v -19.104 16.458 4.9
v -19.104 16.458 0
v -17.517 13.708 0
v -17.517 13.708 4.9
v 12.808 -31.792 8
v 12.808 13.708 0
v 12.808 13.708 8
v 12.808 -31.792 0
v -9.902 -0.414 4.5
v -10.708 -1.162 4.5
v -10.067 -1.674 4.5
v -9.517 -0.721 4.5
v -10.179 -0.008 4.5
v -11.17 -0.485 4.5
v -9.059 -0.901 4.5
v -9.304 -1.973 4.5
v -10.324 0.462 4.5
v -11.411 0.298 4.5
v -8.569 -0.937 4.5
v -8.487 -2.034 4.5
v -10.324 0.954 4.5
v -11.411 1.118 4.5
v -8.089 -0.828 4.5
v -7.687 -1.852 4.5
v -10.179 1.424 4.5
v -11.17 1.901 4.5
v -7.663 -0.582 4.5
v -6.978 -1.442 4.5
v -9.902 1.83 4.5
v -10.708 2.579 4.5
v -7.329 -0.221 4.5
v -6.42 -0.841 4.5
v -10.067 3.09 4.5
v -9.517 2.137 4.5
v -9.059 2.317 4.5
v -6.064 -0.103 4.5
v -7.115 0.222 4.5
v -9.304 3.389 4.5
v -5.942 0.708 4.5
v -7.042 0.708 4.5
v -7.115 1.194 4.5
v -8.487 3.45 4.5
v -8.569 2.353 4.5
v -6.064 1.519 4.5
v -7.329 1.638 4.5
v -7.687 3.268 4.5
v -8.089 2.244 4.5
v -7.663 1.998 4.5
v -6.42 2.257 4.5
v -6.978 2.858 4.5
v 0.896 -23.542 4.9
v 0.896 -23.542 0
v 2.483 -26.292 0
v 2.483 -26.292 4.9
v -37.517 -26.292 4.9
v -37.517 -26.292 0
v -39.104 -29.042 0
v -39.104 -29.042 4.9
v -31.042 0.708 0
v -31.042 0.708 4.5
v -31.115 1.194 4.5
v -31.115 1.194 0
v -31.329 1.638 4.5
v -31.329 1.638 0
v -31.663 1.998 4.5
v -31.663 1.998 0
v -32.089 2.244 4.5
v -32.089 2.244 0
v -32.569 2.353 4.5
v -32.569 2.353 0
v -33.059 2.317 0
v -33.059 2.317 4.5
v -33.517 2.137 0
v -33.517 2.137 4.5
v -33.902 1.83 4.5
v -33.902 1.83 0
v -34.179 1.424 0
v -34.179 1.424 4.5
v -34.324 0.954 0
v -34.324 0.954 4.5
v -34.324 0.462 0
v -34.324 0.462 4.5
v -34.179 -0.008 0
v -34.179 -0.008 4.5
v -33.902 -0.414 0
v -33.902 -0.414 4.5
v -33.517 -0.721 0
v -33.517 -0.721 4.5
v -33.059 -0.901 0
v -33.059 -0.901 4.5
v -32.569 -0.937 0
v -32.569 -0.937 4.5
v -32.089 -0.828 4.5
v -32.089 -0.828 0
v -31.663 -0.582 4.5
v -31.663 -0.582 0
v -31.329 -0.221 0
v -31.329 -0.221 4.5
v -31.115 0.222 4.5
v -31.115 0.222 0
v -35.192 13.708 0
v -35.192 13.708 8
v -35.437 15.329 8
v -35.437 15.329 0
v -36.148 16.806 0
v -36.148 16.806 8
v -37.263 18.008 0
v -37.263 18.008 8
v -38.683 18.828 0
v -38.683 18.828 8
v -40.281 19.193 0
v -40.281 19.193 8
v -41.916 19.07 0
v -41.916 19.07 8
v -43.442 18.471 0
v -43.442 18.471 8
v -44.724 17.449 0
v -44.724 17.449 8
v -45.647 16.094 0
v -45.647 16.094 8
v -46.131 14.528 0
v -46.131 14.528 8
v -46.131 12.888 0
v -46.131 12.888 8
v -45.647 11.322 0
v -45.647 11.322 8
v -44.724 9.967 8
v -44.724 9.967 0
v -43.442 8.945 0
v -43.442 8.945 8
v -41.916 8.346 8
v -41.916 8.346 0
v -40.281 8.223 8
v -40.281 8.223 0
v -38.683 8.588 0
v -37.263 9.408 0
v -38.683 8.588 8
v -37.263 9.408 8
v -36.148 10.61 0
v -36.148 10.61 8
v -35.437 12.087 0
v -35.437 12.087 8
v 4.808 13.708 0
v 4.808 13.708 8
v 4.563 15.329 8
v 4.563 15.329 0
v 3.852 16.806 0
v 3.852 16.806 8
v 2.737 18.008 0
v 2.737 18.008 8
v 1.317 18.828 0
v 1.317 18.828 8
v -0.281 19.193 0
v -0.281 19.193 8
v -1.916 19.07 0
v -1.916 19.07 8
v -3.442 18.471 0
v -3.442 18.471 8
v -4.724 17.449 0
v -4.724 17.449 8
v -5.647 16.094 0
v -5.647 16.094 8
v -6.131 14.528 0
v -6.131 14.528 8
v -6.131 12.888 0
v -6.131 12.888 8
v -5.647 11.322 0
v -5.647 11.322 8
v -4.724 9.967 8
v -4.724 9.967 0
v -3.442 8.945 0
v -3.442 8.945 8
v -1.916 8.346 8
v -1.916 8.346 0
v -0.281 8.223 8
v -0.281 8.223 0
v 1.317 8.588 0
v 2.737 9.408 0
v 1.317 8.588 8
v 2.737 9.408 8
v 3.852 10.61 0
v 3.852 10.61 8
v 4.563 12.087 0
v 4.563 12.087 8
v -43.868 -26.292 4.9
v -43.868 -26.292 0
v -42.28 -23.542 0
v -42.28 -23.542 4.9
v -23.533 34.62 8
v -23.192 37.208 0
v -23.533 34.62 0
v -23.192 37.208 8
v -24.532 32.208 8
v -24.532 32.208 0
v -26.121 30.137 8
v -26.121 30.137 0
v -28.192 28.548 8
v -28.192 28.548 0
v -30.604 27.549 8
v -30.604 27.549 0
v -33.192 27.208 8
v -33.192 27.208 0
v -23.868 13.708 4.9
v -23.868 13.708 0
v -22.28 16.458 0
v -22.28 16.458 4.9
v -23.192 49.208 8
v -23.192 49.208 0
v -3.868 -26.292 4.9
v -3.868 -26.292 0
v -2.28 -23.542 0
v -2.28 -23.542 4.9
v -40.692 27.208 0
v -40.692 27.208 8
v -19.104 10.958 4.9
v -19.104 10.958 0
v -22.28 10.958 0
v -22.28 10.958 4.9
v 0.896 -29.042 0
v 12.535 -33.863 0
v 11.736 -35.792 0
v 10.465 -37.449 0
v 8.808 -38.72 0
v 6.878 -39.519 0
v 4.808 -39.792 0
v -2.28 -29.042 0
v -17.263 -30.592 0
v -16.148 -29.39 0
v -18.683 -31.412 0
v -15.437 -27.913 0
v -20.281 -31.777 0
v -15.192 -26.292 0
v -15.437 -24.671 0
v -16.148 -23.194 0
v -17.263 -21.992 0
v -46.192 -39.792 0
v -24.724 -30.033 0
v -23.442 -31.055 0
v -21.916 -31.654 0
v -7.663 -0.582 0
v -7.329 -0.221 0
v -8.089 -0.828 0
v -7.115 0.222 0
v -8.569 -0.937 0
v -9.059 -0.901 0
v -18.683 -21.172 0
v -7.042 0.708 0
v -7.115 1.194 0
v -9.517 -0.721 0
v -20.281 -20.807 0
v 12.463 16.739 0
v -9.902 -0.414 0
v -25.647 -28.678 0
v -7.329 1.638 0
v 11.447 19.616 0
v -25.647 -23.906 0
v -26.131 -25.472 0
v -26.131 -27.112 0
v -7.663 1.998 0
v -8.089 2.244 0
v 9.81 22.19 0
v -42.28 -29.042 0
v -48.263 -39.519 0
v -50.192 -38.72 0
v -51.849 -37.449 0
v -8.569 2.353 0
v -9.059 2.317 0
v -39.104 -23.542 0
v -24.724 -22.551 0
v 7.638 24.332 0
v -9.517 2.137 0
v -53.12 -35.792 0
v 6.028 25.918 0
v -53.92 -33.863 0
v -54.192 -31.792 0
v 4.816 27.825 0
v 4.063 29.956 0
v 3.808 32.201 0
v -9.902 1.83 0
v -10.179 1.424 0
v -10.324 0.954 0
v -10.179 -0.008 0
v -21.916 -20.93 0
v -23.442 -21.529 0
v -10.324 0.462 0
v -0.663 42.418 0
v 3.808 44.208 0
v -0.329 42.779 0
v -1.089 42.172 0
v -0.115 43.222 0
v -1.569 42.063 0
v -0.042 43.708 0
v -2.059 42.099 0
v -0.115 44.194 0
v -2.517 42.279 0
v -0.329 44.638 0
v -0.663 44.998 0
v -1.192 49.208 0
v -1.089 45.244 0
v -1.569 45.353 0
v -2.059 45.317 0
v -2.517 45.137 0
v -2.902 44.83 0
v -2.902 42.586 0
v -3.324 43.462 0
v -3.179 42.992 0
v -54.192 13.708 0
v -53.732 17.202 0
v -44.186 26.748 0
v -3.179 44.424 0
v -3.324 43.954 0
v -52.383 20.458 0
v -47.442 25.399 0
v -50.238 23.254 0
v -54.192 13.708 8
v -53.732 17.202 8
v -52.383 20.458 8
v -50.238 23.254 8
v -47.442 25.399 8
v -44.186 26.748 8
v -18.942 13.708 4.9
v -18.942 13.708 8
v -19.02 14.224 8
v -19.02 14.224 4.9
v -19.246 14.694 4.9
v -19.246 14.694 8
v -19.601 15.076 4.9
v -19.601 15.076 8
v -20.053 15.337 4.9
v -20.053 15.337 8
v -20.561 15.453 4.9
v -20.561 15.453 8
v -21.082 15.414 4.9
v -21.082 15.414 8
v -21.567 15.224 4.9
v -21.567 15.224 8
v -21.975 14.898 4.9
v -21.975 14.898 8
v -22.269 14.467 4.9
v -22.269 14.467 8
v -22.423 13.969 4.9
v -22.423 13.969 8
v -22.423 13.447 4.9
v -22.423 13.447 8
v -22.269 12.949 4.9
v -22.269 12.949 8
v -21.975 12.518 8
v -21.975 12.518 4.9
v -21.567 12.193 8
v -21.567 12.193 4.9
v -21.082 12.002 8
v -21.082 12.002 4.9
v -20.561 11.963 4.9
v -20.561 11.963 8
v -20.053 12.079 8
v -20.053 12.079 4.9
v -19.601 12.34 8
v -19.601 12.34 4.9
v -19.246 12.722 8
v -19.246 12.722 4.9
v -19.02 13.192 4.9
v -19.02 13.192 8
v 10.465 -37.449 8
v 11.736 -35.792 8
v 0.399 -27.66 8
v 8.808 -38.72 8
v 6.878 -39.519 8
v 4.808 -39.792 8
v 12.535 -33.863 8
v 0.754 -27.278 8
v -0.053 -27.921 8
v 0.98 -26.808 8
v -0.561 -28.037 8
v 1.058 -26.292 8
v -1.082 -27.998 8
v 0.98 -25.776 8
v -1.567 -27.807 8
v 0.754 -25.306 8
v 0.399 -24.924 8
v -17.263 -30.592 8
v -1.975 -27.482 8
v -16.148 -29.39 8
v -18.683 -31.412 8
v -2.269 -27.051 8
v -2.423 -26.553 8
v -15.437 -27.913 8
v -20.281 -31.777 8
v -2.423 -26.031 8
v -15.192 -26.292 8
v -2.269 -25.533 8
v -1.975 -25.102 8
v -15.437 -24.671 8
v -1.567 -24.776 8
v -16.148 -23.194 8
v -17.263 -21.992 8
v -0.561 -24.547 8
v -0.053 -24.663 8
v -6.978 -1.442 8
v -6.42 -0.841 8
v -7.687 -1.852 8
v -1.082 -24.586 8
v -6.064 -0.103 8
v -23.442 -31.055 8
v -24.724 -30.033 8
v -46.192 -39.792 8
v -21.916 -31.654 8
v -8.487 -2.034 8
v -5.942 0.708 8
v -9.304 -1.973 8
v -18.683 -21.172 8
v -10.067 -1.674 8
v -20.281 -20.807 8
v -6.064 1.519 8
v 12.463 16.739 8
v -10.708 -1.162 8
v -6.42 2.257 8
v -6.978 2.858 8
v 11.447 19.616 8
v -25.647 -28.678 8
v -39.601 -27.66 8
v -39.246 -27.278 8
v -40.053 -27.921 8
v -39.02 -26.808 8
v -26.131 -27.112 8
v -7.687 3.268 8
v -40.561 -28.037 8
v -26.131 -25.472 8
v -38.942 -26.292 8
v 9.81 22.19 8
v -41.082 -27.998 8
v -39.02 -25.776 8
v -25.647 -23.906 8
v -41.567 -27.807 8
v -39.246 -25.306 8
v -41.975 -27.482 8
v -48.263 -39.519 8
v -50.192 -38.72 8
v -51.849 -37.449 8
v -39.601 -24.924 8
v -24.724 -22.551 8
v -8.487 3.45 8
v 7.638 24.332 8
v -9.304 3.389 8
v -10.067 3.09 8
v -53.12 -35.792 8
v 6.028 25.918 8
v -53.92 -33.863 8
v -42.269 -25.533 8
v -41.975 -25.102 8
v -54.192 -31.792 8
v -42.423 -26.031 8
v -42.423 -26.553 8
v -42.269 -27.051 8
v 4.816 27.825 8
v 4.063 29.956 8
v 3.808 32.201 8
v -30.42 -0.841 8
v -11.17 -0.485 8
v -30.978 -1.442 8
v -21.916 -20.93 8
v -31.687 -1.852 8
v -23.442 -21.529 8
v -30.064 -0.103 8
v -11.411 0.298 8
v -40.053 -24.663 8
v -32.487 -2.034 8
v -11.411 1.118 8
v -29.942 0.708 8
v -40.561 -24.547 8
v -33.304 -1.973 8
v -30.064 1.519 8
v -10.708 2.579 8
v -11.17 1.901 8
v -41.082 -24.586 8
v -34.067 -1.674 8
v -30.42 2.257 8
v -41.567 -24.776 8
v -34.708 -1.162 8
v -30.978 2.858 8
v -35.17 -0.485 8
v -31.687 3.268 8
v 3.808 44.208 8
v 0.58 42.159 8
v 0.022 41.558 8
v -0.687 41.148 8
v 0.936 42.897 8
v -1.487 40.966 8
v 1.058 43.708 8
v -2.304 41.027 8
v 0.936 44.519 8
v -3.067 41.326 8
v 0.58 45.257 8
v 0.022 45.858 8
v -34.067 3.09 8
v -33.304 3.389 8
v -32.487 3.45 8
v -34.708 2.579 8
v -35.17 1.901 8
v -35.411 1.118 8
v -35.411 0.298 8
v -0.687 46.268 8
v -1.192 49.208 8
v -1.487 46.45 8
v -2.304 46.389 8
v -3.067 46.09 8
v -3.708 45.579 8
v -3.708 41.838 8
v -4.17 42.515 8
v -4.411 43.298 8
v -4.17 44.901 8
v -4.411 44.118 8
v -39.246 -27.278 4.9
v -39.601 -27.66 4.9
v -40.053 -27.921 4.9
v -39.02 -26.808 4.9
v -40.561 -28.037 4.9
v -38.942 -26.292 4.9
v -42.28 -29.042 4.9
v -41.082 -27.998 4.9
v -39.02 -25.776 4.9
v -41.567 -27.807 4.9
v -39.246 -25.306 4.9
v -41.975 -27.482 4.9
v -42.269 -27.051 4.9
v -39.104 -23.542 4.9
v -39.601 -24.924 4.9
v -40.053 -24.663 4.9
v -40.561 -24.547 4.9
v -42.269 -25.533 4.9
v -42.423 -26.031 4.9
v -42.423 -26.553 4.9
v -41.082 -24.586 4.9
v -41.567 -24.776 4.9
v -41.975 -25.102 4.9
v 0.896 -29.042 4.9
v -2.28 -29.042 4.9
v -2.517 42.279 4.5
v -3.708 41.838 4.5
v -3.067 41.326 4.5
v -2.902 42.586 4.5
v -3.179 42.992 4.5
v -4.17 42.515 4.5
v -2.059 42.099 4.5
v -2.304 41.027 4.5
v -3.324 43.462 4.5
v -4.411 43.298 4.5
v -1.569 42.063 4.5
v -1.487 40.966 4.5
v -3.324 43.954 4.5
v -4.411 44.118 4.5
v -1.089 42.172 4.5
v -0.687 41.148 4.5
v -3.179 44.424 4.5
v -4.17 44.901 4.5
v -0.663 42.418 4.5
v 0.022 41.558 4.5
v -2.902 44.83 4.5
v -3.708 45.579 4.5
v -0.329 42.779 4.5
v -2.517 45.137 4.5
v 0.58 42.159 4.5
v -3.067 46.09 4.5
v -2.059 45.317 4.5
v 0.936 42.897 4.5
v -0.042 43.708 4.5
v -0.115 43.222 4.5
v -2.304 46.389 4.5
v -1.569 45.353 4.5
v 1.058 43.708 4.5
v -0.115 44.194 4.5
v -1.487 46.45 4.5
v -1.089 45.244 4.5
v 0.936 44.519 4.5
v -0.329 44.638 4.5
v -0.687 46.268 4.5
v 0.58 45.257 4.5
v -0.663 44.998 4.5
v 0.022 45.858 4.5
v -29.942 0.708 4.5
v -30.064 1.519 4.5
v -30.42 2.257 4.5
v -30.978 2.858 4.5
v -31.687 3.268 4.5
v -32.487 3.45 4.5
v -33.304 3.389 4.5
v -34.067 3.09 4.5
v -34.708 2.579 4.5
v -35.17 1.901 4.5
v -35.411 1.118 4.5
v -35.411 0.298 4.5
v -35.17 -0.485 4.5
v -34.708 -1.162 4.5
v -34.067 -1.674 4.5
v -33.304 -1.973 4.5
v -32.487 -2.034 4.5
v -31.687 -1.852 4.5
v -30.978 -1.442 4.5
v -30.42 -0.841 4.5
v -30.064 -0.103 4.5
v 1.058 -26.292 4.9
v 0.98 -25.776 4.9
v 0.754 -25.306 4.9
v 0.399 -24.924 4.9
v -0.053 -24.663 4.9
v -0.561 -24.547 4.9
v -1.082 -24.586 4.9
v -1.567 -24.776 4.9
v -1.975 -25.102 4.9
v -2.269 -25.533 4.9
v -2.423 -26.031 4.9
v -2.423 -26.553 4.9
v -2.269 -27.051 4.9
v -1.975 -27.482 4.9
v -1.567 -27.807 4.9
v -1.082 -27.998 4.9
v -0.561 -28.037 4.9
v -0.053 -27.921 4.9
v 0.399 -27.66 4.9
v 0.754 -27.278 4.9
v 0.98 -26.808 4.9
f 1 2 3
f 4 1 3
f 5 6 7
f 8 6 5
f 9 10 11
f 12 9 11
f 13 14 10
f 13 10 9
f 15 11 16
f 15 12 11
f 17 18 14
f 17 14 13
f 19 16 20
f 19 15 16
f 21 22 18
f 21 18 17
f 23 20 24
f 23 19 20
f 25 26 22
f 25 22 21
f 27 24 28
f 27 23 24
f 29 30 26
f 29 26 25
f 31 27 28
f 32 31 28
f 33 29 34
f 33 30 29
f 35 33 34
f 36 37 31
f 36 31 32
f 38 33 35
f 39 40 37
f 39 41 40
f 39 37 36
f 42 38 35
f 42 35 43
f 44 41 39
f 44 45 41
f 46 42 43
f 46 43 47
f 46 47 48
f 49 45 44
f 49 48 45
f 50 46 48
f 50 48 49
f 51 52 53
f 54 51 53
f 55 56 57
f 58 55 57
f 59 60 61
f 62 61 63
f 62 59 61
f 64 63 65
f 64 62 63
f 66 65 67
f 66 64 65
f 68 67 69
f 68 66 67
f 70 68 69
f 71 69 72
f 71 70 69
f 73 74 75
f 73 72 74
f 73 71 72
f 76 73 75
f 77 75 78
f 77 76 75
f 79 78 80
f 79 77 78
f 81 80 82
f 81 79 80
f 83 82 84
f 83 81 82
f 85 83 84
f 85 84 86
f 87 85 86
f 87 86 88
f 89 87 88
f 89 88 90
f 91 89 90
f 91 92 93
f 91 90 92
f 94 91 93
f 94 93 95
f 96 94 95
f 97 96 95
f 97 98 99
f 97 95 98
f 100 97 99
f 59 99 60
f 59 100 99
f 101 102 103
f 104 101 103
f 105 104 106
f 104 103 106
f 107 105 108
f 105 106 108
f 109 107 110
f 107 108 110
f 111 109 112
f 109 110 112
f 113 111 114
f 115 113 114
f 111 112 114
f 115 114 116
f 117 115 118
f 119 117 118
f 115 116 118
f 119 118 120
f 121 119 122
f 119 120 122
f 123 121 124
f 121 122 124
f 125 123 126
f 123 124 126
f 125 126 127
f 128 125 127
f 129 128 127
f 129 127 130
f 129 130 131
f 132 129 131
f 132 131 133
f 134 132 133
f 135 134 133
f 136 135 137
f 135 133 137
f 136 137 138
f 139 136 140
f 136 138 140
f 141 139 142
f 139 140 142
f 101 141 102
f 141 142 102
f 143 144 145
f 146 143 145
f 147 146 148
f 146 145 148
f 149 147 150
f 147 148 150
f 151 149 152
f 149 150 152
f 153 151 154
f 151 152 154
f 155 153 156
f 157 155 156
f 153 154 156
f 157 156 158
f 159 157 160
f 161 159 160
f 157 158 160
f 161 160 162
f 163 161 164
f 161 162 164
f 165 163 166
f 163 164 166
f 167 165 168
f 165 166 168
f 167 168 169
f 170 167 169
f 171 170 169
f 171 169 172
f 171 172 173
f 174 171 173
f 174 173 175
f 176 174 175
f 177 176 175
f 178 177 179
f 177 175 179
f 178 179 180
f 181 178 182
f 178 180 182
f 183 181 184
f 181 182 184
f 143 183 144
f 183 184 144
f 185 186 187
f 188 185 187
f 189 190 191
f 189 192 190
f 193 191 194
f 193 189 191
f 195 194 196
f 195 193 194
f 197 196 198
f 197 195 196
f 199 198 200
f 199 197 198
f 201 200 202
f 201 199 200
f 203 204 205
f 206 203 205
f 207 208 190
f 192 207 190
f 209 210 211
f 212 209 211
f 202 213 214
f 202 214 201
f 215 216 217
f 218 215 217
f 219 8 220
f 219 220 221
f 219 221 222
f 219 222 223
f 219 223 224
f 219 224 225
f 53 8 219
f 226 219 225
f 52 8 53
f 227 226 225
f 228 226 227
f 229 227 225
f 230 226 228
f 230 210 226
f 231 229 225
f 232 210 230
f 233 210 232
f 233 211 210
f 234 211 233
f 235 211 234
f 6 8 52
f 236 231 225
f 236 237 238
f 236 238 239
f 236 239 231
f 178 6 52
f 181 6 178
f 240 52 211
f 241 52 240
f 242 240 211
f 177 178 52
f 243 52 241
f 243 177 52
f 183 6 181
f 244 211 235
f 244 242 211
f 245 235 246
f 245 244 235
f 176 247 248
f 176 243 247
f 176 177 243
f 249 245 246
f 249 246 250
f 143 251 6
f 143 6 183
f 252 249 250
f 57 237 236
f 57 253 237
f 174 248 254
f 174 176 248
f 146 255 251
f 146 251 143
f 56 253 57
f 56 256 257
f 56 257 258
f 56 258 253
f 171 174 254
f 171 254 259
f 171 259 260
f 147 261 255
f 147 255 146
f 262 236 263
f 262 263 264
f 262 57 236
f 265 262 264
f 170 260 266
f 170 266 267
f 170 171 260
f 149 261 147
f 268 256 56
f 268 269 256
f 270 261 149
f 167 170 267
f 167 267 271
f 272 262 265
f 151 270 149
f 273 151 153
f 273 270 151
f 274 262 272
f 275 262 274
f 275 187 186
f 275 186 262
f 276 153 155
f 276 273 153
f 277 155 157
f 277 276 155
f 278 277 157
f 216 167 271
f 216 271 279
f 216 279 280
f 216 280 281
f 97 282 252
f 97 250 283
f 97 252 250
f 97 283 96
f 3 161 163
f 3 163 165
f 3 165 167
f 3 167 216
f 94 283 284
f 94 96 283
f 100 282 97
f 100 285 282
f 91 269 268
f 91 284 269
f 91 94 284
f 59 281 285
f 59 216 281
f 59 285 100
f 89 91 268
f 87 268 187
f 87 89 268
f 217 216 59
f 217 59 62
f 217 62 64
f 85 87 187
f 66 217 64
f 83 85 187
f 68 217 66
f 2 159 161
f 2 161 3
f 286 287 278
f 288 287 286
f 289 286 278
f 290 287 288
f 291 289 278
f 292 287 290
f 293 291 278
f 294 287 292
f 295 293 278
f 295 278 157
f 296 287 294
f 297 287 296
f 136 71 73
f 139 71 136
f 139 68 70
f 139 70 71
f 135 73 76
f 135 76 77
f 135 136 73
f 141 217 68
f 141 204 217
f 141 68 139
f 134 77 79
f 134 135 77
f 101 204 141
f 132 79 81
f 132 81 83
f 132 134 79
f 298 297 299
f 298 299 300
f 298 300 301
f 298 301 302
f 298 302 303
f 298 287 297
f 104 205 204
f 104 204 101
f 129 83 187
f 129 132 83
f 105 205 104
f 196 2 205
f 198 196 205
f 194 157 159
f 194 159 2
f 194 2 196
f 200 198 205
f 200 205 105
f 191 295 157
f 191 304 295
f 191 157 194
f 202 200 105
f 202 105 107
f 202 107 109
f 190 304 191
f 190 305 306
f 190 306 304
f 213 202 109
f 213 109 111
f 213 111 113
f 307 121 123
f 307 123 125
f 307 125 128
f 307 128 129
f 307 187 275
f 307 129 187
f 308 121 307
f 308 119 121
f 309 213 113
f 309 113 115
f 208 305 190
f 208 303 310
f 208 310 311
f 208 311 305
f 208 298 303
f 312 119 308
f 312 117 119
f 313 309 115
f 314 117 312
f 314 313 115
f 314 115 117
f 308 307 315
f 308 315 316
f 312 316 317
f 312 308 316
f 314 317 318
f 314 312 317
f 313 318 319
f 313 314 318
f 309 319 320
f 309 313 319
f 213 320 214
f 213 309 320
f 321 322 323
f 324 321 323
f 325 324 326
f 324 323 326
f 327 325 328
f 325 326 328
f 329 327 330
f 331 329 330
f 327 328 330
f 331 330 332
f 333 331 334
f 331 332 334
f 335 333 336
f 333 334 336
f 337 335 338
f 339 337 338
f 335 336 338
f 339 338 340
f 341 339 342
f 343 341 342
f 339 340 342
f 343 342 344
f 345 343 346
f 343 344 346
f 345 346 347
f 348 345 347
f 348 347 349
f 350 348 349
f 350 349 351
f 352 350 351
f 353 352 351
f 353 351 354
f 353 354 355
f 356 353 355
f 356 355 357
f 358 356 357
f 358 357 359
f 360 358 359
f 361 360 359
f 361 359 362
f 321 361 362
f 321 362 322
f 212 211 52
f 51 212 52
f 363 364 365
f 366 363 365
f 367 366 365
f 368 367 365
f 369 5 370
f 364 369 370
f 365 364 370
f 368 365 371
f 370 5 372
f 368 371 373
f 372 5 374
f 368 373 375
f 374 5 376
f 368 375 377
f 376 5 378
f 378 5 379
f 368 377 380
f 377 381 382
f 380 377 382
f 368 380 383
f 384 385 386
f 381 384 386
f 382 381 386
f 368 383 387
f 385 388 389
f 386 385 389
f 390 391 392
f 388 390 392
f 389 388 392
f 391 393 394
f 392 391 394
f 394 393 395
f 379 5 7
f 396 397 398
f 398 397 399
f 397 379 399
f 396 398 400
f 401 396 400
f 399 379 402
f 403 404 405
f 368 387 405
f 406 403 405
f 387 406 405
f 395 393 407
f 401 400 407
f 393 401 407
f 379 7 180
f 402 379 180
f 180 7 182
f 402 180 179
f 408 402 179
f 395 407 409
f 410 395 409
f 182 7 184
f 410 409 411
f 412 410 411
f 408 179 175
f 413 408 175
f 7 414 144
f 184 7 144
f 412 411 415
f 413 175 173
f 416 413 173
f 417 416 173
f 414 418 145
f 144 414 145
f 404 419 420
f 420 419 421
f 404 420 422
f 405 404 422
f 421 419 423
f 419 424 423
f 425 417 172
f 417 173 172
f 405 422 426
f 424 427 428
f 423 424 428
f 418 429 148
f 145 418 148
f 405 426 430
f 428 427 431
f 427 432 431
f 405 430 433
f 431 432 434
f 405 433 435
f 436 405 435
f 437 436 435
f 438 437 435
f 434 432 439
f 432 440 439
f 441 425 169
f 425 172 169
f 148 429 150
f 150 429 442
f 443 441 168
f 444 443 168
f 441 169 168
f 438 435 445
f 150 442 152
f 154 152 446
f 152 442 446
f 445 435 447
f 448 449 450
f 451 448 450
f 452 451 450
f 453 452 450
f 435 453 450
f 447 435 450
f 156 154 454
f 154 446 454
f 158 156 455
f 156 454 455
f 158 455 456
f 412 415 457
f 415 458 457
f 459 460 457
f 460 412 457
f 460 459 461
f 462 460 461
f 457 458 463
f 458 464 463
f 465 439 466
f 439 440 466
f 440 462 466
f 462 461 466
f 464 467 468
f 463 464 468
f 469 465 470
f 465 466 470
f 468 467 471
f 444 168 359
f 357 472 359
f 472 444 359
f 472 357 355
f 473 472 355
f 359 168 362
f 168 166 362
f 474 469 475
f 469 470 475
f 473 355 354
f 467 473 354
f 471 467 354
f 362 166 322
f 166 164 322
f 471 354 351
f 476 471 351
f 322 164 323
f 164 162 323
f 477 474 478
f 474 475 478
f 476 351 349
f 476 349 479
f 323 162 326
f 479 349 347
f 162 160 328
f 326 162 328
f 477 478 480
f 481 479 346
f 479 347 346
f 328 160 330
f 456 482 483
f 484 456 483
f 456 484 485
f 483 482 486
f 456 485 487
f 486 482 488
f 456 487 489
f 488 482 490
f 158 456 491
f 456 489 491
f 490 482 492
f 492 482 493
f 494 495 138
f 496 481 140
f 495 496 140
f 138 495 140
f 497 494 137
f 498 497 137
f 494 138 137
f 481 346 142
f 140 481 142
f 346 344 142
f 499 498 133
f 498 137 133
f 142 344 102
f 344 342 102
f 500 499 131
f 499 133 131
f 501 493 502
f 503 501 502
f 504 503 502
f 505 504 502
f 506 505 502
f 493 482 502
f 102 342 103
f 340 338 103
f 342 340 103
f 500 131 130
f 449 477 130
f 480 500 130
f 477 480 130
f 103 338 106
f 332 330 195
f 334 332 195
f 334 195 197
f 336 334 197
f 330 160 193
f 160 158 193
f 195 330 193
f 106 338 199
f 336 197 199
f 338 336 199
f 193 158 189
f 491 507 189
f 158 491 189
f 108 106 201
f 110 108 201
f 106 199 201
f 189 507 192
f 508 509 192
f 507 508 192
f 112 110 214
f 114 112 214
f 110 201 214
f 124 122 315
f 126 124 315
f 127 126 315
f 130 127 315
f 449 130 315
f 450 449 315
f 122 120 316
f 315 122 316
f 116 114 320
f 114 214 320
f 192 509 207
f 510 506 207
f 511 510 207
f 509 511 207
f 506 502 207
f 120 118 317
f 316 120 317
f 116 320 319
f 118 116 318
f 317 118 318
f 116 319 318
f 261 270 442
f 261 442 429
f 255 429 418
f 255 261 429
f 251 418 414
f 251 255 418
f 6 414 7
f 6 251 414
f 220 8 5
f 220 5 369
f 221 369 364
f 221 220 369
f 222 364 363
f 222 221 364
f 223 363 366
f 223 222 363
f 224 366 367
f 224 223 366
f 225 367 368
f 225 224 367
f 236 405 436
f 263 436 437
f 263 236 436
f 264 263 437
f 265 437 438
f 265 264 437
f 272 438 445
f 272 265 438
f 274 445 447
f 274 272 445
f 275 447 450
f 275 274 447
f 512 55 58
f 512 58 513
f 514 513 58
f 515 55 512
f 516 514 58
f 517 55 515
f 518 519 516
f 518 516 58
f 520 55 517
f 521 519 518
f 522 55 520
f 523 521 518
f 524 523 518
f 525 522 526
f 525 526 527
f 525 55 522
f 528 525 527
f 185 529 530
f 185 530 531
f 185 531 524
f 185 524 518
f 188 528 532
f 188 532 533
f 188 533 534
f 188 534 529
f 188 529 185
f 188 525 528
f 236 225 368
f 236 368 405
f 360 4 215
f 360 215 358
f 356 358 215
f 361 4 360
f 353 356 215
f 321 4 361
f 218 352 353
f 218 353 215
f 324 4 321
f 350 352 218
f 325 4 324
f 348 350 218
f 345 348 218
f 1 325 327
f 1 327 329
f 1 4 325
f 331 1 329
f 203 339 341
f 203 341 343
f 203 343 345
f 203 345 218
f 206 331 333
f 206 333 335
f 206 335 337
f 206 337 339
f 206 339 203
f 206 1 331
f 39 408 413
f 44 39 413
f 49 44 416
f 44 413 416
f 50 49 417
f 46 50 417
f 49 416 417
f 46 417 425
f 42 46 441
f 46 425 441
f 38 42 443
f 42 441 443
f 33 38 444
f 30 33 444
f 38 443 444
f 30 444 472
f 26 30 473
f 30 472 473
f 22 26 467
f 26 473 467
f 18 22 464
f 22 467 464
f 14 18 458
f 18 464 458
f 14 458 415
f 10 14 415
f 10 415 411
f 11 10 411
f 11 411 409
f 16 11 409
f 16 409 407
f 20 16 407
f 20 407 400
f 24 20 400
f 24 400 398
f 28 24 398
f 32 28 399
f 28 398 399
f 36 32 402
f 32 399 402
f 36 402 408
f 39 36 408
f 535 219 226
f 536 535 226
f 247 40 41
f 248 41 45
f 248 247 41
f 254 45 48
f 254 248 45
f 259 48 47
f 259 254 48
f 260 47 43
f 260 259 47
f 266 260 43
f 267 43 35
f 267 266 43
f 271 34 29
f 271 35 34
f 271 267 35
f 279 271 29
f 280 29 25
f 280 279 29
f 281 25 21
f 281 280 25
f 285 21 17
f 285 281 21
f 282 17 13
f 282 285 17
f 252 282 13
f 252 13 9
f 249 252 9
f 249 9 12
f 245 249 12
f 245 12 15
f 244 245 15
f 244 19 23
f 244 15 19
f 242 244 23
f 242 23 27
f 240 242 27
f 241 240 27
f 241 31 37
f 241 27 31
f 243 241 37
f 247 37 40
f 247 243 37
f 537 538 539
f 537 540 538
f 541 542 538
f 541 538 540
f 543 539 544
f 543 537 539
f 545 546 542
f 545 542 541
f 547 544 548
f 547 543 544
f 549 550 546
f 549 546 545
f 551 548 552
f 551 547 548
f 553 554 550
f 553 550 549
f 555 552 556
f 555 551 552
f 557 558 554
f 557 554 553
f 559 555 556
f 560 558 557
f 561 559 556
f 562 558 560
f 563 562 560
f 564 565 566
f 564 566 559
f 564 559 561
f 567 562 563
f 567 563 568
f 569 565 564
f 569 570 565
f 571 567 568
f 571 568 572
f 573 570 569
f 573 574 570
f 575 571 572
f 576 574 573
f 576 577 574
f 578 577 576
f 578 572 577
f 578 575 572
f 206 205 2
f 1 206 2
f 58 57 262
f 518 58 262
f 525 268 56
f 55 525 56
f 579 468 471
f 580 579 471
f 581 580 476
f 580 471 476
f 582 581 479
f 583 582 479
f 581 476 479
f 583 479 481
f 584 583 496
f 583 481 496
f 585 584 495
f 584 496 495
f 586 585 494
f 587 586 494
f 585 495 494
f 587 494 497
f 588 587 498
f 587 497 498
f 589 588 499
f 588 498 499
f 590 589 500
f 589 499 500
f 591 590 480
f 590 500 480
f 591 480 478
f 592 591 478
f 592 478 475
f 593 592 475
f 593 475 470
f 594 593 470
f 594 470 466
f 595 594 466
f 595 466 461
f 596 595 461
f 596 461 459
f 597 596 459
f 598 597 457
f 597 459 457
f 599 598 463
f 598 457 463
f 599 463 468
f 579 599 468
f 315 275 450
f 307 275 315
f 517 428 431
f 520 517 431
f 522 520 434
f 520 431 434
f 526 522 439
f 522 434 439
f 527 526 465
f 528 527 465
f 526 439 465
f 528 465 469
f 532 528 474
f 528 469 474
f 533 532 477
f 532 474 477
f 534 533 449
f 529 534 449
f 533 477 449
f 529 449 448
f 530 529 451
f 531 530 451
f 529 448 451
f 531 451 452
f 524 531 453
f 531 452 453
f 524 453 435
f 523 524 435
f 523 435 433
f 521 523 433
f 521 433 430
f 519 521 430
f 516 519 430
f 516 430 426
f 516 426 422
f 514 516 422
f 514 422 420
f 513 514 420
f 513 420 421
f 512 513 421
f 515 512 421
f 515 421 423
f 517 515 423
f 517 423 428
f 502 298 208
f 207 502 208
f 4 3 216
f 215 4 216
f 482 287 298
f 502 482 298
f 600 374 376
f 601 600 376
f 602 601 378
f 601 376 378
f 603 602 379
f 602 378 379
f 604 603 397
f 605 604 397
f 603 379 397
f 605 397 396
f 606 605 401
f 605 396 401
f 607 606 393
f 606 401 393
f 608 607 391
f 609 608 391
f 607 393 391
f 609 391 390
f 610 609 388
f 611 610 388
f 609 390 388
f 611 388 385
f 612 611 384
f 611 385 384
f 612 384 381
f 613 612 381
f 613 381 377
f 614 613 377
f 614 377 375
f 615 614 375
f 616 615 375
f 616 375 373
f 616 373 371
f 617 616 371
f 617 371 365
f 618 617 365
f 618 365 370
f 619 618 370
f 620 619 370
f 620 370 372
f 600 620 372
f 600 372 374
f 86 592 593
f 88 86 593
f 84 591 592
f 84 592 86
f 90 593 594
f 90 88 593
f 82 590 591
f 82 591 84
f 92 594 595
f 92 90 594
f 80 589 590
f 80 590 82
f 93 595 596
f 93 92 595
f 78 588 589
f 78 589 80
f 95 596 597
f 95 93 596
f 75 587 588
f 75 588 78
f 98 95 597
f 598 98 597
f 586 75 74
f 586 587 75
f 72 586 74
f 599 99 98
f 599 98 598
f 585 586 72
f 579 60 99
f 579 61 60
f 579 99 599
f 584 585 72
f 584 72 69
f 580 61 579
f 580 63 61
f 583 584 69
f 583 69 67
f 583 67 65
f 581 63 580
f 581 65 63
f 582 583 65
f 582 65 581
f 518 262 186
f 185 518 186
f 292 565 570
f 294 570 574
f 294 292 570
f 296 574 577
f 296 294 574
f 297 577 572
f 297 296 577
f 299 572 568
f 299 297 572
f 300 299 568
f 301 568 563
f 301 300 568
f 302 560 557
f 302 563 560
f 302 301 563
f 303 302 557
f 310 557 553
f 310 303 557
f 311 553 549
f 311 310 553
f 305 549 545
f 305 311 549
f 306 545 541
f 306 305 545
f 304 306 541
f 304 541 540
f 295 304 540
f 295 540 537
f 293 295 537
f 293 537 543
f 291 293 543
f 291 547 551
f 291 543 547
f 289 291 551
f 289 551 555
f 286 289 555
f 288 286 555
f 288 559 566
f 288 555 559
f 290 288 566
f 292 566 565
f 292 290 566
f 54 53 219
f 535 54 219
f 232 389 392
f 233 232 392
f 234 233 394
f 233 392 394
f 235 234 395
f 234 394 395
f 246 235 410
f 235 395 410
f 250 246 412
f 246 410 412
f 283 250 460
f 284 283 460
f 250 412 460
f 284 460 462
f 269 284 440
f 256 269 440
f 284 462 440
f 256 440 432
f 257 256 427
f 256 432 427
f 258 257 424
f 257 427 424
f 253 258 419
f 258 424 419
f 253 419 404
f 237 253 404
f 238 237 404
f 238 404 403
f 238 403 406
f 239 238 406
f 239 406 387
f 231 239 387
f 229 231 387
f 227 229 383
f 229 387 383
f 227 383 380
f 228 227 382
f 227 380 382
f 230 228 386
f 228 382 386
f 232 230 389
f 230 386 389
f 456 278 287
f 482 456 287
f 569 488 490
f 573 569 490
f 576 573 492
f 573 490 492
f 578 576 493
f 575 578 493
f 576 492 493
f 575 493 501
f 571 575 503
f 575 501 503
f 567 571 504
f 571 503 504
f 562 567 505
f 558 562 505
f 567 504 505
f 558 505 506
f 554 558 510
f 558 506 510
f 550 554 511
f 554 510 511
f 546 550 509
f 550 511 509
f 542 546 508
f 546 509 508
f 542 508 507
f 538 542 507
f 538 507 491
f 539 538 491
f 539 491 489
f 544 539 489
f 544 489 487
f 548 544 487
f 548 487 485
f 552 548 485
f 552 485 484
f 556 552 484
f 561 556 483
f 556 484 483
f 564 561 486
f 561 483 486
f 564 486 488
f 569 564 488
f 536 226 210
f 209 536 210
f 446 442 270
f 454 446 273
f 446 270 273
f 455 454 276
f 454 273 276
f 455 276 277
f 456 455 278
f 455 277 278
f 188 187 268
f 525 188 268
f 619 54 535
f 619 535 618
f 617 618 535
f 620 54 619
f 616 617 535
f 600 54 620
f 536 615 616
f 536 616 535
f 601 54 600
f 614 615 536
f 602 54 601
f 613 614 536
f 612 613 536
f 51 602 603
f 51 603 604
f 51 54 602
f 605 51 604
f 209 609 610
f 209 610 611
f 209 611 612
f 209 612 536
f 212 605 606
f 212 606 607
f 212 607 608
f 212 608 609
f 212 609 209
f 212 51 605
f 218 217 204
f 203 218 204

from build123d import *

# Parameters (mm, degrees)
ESBO_O7_R                = 1.65
RESSALTO_EXTRUS_O5_DEPTH = 8
RESSALTO_EXTRUS_O6_START = -8
ESBO_O10_R               = 1.65
RESSALTO_EXTRUS_O6_DEPTH = 8
ESBO_O8_R                = 5.5
CORTE_EXTRUS_O4_DEPTH    = 8
FILETE1_R                = 10
ESBO_O11_R               = 2.75
CORTE_EXTRUS_O5_DEPTH    = 3.5
ESBO_O14_R               = 1.75
CORTE_EXTRUS_O9_DEPTH    = 8
CORTE_EXTRUS_O10_DEPTH   = 4.9


with BuildPart() as part:
    # Esboço7 → Ressalto-extrusão5 (new body)
    with BuildSketch(Plane.XY):
        Polygon((-45.692156379, 16.70804449), (-45.692156379, -36.79195551), (6.807843621, -36.79195551), (6.807843621, 4.155908866), (3.801241904, 7.162510584), (3.84677581, 7.20804449), (3.807843621, 7.20804449), (3.807843621, 44.20804449), (-1.192156379, 49.20804449), (-23.192156379, 49.20804449), (-23.192156379, 16.70804449), align=None)
        with Locations((-1.692156379, 43.70804449)):
            Circle(ESBO_O7_R, mode=Mode.SUBTRACT)
        with Locations((-32.692156379, 0.70804449)):
            Circle(ESBO_O7_R, mode=Mode.SUBTRACT)
        with Locations((-8.692156379, 0.70804449)):
            Circle(ESBO_O7_R, mode=Mode.SUBTRACT)
    extrude(amount=RESSALTO_EXTRUS_O5_DEPTH)

    # Esboço10 → Ressalto-extrusão6 (add)
    with BuildSketch(Plane.XY.offset(8).offset(RESSALTO_EXTRUS_O6_START)):
        with BuildLine():
            Line((12.807843621, 13.70804449), (12.807843621, -31.79195551))
            ThreePointArc((12.807843621, -31.79195551), (10.464697871, -37.44880976), (4.807843621, -39.79195551))
            Line((4.807843621, -39.79195551), (-46.192156379, -39.79195551))
            ThreePointArc((-46.192156379, -39.79195551), (-51.849010628, -37.44880976), (-54.192156379, -31.79195551))
            Line((-54.192156379, -31.79195551), (-54.192156379, 13.70804449))
            ThreePointArc((-54.192156379, 13.70804449), (-50.238097925, 23.253986036), (-40.692156379, 27.20804449))
            Line((-40.692156379, 27.20804449), (-0.692156379, 27.20804449))
            ThreePointArc((-0.692156379, 27.20804449), (8.853785167, 23.253986036), (12.807843621, 13.70804449))
        make_face()
        with Locations((-8.692156379, 0.70804449)):
            Circle(ESBO_O10_R, mode=Mode.SUBTRACT)
        with Locations((-32.692156379, 0.70804449)):
            Circle(ESBO_O10_R, mode=Mode.SUBTRACT)
    extrude(amount=RESSALTO_EXTRUS_O6_DEPTH)

    # Esboço8 → Corte-extrusão4 (cut)
    with BuildSketch(Plane.XY.offset(8)):
        with Locations((-40.692156379, 13.70804449)):
            Circle(ESBO_O8_R)
        with Locations((-0.692156379, 13.70804449)):
            Circle(ESBO_O8_R)
        with Locations((-20.692156379, -26.29195551)):
            Circle(ESBO_O8_R)
    extrude(amount=-CORTE_EXTRUS_O4_DEPTH, mode=Mode.SUBTRACT)

    # Filete1
    filete1_edges = [part.edges().sort_by_distance(p)[0] for p in [
        (-23.192156379, 27.20804449, 4),
        (3.807843621, 26.435966551, 4),
    ]]
    fillet(filete1_edges, radius=FILETE1_R)

    # Esboço11 → Corte-extrusão5 (cut)
    with BuildSketch(Plane.XY.offset(8)):
        with Locations((-32.692156379, 0.70804449)):
            Circle(ESBO_O11_R)
        with Locations((-8.692156379, 0.70804449)):
            Circle(ESBO_O11_R)
        with Locations((-1.692156379, 43.70804449)):
            Circle(ESBO_O11_R)
    extrude(amount=-CORTE_EXTRUS_O5_DEPTH, mode=Mode.SUBTRACT)

    # Esboço14 → Corte-extrusão9 (cut)
    with BuildSketch(Plane.XY.offset(8)):
        with Locations((-20.692156379, 13.70804449)):
            Circle(ESBO_O14_R)
        with Locations((-40.692156379, -26.29195551)):
            Circle(ESBO_O14_R)
        with Locations((-0.692156379, -26.29195551)):
            Circle(ESBO_O14_R)
    extrude(amount=-CORTE_EXTRUS_O9_DEPTH, mode=Mode.SUBTRACT)

    # Esboço15 → Corte-extrusão10 (cut)
    with BuildSketch(Plane(origin=(0, 0, 0), x_dir=(-1, 0, 0), z_dir=(0, 0, -1))):
        Polygon((23.867582859, 13.70804449), (22.279869619, 16.45804449), (19.104443138, 16.45804449), (17.516729898, 13.70804449), (19.104443138, 10.95804449), (22.279869619, 10.95804449), align=None)
        Polygon((3.867582859, -26.29195551), (2.279869619, -23.54195551), (-0.895556862, -23.54195551), (-2.483270102, -26.29195551), (-0.895556862, -29.04195551), (2.279869619, -29.04195551), align=None)
        Polygon((43.867582859, -26.29195551), (42.279869619, -23.54195551), (39.104443138, -23.54195551), (37.516729898, -26.29195551), (39.104443138, -29.04195551), (42.279869619, -29.04195551), align=None)
    extrude(amount=-CORTE_EXTRUS_O10_DEPTH, mode=Mode.SUBTRACT)


solid = part.part
